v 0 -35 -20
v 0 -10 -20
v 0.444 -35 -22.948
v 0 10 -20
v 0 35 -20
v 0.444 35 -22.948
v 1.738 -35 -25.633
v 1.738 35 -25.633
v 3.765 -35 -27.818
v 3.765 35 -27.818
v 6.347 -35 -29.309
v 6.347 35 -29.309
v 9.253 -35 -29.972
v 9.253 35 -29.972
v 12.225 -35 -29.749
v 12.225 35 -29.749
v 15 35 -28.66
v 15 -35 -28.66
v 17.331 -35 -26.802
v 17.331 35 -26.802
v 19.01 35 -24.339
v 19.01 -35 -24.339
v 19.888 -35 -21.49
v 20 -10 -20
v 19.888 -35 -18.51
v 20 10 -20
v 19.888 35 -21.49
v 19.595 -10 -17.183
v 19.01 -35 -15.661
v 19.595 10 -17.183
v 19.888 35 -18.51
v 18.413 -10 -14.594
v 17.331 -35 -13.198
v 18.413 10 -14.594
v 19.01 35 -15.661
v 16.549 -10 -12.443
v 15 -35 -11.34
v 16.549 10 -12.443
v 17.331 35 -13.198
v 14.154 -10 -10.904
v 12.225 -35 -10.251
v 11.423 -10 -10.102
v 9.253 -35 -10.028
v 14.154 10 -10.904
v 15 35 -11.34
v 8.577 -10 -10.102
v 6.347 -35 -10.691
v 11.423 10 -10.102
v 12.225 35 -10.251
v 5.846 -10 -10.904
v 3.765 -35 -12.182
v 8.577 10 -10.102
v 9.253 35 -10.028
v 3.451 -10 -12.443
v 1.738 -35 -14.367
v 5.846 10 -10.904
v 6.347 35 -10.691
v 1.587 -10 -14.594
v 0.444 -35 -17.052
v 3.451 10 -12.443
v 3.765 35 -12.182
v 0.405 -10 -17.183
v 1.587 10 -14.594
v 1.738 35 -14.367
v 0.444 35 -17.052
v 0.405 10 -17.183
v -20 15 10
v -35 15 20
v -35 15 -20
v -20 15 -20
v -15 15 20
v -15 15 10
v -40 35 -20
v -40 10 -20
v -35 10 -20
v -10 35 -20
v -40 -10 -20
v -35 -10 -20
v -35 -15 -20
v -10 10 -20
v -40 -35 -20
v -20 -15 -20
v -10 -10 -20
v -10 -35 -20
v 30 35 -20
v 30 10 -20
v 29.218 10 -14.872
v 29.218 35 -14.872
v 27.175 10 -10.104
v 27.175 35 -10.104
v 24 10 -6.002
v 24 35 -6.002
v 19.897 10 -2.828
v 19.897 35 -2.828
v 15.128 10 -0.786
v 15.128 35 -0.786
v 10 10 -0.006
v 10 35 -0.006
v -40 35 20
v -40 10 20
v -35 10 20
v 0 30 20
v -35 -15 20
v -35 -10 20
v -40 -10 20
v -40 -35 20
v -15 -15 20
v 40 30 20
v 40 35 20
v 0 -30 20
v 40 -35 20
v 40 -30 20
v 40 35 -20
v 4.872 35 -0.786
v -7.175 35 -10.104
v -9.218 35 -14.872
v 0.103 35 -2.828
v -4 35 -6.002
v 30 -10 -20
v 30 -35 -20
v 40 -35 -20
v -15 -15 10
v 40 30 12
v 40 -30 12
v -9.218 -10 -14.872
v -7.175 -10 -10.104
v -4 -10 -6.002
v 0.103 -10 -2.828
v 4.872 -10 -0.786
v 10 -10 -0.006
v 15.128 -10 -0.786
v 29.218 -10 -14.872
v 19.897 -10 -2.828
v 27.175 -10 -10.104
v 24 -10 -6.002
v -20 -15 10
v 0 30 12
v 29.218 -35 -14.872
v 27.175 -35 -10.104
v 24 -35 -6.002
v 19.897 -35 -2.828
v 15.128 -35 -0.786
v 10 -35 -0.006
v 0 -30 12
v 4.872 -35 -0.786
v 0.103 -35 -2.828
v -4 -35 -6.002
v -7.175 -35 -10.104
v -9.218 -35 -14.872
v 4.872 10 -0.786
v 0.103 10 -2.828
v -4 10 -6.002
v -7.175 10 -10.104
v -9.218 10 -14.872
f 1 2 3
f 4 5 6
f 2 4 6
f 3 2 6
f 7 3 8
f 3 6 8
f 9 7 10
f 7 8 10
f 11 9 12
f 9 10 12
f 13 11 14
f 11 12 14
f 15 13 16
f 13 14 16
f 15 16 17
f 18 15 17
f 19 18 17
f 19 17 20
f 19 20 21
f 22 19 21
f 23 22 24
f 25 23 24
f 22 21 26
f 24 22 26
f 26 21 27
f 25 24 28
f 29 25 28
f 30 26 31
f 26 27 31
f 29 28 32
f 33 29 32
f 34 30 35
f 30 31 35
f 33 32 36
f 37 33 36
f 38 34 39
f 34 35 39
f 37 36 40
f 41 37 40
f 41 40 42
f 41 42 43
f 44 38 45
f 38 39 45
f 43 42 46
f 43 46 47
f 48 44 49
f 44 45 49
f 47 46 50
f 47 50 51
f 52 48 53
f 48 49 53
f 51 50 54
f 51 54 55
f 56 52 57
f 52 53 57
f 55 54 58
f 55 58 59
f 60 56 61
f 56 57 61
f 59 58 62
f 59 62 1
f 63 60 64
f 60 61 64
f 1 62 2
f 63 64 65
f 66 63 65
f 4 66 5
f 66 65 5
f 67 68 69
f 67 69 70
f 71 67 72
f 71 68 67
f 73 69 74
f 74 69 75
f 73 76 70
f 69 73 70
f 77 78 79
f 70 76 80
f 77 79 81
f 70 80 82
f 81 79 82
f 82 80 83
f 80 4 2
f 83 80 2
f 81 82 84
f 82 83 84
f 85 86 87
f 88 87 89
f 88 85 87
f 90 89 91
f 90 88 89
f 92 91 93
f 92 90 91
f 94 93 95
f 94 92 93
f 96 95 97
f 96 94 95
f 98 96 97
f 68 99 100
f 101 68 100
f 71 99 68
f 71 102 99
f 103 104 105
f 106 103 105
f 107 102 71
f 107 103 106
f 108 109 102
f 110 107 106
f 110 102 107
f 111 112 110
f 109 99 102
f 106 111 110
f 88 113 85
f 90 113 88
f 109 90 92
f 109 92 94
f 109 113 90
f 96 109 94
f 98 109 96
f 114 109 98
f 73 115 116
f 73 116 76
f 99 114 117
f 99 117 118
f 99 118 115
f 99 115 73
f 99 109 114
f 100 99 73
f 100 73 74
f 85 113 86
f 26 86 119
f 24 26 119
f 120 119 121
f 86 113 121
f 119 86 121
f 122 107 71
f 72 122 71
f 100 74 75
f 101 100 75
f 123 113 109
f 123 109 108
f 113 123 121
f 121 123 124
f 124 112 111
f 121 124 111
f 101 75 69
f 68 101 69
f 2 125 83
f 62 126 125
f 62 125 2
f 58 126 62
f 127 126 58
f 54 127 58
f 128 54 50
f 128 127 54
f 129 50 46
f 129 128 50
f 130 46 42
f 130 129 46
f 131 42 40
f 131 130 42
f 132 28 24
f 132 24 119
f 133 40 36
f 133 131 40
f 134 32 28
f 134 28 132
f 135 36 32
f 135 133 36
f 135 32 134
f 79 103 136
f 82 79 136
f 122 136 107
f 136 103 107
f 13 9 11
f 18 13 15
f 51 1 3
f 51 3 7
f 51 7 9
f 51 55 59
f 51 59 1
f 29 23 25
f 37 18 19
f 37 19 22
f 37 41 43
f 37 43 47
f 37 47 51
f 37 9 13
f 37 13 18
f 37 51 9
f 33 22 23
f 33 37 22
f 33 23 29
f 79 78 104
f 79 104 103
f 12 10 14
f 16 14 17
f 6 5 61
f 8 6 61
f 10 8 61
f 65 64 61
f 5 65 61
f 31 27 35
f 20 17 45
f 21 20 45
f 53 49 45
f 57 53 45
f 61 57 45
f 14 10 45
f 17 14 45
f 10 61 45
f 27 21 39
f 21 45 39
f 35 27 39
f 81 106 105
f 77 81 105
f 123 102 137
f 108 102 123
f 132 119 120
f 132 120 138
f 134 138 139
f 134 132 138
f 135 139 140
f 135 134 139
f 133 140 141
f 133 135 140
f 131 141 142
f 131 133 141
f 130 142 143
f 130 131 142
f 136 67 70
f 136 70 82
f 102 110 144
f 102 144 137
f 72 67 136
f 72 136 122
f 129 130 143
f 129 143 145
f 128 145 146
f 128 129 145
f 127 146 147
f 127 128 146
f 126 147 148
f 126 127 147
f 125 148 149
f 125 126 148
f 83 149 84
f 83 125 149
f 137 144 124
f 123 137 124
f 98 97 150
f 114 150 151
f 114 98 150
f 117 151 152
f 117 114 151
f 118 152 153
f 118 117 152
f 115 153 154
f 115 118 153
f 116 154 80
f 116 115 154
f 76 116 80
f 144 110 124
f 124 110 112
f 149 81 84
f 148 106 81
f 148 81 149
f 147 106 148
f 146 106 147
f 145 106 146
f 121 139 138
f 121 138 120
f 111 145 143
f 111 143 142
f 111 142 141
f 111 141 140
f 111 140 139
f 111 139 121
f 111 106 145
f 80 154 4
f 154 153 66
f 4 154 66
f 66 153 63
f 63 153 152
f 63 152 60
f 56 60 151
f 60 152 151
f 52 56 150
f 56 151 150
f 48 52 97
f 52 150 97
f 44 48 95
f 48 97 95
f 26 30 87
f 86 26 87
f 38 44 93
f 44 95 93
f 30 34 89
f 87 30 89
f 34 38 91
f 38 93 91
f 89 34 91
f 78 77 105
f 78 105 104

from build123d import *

# Parameters (mm, degrees)
F0_W          = 70
F0_H          = 40
F1_DEPTH      = 40
F1_DEPTH_BACK = 40
F2_W          = 40
F2_H          = 30
F3_DEPTH      = 8
F5_DEPTH      = 40
F6_W          = 40
F6_H          = 20
F7_DEPTH      = 25
F9_DEPTH      = 25
F10_W         = 80
F10_H         = 40
F11_DEPTH     = 35
F13_DEPTH     = 25
F14_T4_DEPTH  = 76.2347538298
F14_T9_DEPTH  = 76.2347538298
F14_T14_DEPTH = 76.2347538298
F14_T19_DEPTH = 76.2347538298
F15_W         = 5
F15_H         = 30
F16_DEPTH     = 10


# Not quite as in the source:
# - a fillet or chamfer that OpenCascade refuses, or shapes differently, is made with other operations: its cross-section is extruded or revolved along the edge and cut away or added


with BuildPart() as f1:
    # F0 (on Right) → F1 (new body, two sides)
    with BuildSketch(Plane.YZ) as f1_sk:
        Rectangle(F0_W, F0_H)
    extrude(amount=F1_DEPTH)
    extrude(f1_sk.sketch, amount=-F1_DEPTH_BACK)

    # F2 (on face) → F3 (cut)
    with BuildSketch(Plane.XY.offset(20)):
        with Locations((20, -15)):
            Rectangle(F2_W, F2_H)
        with Locations((20, 15)):
            Rectangle(F2_W, F2_H)
    extrude(amount=-F3_DEPTH, mode=Mode.SUBTRACT)

    # F4 (on face) → F5 (cut)
    with BuildSketch(Plane.XY.offset(20)):
        Polygon((-40, 10), (-40, 0), (-20, 0), (-20, 15), (-35, 15), (-35, 10), align=None)
        Polygon((-20, 0), (-40, 0), (-40, -10), (-35, -10), (-35, -15), (-20, -15), align=None)
    extrude(amount=-F5_DEPTH, mode=Mode.SUBTRACT)

    # F6 (on face) → F7 (cut)
    with BuildSketch(Plane.XZ.offset(35)):
        with Locations((10, -10)):
            Rectangle(F6_W, F6_H)
    extrude(amount=-F7_DEPTH, mode=Mode.SUBTRACT)

    # F8 (on face) → F9 (join)
    with BuildSketch(Plane.XZ.offset(10)):
        with BuildLine():
            Line((0, -20), (20, -20))
            ThreePointArc((20, -20), (10, -10), (0, -20))
        make_face()
        with BuildLine():
            ThreePointArc((0, -20), (10, -30), (20, -20))
            Line((20, -20), (0, -20))
        make_face()
    extrude(amount=F9_DEPTH)

    # F10 (on face) → F11 (cut)
    with BuildSketch(Plane(origin=(0, 35, 0), x_dir=(-1, 0, 0), z_dir=(0, 1, 0))):
        Rectangle(F10_W, F10_H)
    extrude(amount=-F11_DEPTH, mode=Mode.SUBTRACT)

    # F12: F1 across plane


with BuildPart() as f1_1:
    add(f1.part)
    add(f1.part.mirror(Plane.XZ))

    # F13 (add): a face of the model
    f13_faces = [f1_1.faces().sort_by_distance(p)[0] for p in [
        (10, -10, -24.2441318158),
    ]]
    extrude(f13_faces, amount=F13_DEPTH)

    # F14: fillet of radius 20.5 on 4 edges, made by hand


with BuildPart() as f14_tool2:
    # F14_s3 → F14_t4 (new body)
    with BuildSketch(Plane.XZ.offset(-35)):
        with BuildLine():
            ThreePointArc((30, -20), (23.8239195314, -5.8285992489), (9.5060984681, 0))
            Line((9.5060984681, 0), (30, 0))
            Line((30, 0), (30, -20))
        make_face()
    extrude(amount=F14_T4_DEPTH)

    split(bisect_by=Plane.XZ.offset(35), keep=Keep.BOTTOM)


with BuildPart() as f1_2:
    add(f1_1.part)

    # F14_t1: union F14_tool2
    add(f14_tool2.part)


with BuildPart() as f14_tool7:
    # F14_s8 → F14_t9 (new body)
    with BuildSketch(Plane.XZ.offset(-35)):
        with BuildLine():
            ThreePointArc((10.4939015319, 0), (-3.8239195314, -5.8285992489), (-10, -20))
            Line((-10, -20), (-10, 0))
            Line((-10, 0), (10.4939015319, 0))
        make_face()
    extrude(amount=F14_T9_DEPTH)

    split(bisect_by=Plane.XZ.offset(35), keep=Keep.BOTTOM)


with BuildPart() as f1_3:
    add(f1_2.part)

    # F14_t6: union F14_tool7
    add(f14_tool7.part)


with BuildPart() as f14_tool12:
    # F14_s13 → F14_t14 (new body)
    with BuildSketch(Plane.XZ.offset(35)):
        with BuildLine():
            ThreePointArc((30, -20), (23.8239195314, -5.8285992489), (9.5060984681, 0))
            Line((9.5060984681, 0), (30, 0))
            Line((30, 0), (30, -20))
        make_face()
    extrude(amount=-F14_T14_DEPTH)

    split(bisect_by=Plane.XZ.offset(-35), keep=Keep.TOP)


with BuildPart() as f1_4:
    add(f1_3.part)

    # F14_t11: union F14_tool12
    add(f14_tool12.part)


with BuildPart() as f14_tool17:
    # F14_s18 → F14_t19 (new body)
    with BuildSketch(Plane.XZ.offset(35)):
        with BuildLine():
            ThreePointArc((-10, -20), (-3.8239195314, -5.8285992489), (10.4939015319, 0))
            Line((10.4939015319, 0), (-10, 0))
            Line((-10, 0), (-10, -20))
        make_face()
    extrude(amount=-F14_T19_DEPTH)

    split(bisect_by=Plane.XZ.offset(-35), keep=Keep.TOP)


with BuildPart() as f1_5:
    add(f1_4.part)

    # F14_t16: union F14_tool17
    add(f14_tool17.part)

    # F15 (on face) → F16 (cut)
    with BuildSketch(Plane.XY.offset(20)):
        with Locations((-17.5, 0)):
            Rectangle(F15_W, F15_H)
    extrude(amount=-F16_DEPTH, mode=Mode.SUBTRACT)


solid = f1_5.part
